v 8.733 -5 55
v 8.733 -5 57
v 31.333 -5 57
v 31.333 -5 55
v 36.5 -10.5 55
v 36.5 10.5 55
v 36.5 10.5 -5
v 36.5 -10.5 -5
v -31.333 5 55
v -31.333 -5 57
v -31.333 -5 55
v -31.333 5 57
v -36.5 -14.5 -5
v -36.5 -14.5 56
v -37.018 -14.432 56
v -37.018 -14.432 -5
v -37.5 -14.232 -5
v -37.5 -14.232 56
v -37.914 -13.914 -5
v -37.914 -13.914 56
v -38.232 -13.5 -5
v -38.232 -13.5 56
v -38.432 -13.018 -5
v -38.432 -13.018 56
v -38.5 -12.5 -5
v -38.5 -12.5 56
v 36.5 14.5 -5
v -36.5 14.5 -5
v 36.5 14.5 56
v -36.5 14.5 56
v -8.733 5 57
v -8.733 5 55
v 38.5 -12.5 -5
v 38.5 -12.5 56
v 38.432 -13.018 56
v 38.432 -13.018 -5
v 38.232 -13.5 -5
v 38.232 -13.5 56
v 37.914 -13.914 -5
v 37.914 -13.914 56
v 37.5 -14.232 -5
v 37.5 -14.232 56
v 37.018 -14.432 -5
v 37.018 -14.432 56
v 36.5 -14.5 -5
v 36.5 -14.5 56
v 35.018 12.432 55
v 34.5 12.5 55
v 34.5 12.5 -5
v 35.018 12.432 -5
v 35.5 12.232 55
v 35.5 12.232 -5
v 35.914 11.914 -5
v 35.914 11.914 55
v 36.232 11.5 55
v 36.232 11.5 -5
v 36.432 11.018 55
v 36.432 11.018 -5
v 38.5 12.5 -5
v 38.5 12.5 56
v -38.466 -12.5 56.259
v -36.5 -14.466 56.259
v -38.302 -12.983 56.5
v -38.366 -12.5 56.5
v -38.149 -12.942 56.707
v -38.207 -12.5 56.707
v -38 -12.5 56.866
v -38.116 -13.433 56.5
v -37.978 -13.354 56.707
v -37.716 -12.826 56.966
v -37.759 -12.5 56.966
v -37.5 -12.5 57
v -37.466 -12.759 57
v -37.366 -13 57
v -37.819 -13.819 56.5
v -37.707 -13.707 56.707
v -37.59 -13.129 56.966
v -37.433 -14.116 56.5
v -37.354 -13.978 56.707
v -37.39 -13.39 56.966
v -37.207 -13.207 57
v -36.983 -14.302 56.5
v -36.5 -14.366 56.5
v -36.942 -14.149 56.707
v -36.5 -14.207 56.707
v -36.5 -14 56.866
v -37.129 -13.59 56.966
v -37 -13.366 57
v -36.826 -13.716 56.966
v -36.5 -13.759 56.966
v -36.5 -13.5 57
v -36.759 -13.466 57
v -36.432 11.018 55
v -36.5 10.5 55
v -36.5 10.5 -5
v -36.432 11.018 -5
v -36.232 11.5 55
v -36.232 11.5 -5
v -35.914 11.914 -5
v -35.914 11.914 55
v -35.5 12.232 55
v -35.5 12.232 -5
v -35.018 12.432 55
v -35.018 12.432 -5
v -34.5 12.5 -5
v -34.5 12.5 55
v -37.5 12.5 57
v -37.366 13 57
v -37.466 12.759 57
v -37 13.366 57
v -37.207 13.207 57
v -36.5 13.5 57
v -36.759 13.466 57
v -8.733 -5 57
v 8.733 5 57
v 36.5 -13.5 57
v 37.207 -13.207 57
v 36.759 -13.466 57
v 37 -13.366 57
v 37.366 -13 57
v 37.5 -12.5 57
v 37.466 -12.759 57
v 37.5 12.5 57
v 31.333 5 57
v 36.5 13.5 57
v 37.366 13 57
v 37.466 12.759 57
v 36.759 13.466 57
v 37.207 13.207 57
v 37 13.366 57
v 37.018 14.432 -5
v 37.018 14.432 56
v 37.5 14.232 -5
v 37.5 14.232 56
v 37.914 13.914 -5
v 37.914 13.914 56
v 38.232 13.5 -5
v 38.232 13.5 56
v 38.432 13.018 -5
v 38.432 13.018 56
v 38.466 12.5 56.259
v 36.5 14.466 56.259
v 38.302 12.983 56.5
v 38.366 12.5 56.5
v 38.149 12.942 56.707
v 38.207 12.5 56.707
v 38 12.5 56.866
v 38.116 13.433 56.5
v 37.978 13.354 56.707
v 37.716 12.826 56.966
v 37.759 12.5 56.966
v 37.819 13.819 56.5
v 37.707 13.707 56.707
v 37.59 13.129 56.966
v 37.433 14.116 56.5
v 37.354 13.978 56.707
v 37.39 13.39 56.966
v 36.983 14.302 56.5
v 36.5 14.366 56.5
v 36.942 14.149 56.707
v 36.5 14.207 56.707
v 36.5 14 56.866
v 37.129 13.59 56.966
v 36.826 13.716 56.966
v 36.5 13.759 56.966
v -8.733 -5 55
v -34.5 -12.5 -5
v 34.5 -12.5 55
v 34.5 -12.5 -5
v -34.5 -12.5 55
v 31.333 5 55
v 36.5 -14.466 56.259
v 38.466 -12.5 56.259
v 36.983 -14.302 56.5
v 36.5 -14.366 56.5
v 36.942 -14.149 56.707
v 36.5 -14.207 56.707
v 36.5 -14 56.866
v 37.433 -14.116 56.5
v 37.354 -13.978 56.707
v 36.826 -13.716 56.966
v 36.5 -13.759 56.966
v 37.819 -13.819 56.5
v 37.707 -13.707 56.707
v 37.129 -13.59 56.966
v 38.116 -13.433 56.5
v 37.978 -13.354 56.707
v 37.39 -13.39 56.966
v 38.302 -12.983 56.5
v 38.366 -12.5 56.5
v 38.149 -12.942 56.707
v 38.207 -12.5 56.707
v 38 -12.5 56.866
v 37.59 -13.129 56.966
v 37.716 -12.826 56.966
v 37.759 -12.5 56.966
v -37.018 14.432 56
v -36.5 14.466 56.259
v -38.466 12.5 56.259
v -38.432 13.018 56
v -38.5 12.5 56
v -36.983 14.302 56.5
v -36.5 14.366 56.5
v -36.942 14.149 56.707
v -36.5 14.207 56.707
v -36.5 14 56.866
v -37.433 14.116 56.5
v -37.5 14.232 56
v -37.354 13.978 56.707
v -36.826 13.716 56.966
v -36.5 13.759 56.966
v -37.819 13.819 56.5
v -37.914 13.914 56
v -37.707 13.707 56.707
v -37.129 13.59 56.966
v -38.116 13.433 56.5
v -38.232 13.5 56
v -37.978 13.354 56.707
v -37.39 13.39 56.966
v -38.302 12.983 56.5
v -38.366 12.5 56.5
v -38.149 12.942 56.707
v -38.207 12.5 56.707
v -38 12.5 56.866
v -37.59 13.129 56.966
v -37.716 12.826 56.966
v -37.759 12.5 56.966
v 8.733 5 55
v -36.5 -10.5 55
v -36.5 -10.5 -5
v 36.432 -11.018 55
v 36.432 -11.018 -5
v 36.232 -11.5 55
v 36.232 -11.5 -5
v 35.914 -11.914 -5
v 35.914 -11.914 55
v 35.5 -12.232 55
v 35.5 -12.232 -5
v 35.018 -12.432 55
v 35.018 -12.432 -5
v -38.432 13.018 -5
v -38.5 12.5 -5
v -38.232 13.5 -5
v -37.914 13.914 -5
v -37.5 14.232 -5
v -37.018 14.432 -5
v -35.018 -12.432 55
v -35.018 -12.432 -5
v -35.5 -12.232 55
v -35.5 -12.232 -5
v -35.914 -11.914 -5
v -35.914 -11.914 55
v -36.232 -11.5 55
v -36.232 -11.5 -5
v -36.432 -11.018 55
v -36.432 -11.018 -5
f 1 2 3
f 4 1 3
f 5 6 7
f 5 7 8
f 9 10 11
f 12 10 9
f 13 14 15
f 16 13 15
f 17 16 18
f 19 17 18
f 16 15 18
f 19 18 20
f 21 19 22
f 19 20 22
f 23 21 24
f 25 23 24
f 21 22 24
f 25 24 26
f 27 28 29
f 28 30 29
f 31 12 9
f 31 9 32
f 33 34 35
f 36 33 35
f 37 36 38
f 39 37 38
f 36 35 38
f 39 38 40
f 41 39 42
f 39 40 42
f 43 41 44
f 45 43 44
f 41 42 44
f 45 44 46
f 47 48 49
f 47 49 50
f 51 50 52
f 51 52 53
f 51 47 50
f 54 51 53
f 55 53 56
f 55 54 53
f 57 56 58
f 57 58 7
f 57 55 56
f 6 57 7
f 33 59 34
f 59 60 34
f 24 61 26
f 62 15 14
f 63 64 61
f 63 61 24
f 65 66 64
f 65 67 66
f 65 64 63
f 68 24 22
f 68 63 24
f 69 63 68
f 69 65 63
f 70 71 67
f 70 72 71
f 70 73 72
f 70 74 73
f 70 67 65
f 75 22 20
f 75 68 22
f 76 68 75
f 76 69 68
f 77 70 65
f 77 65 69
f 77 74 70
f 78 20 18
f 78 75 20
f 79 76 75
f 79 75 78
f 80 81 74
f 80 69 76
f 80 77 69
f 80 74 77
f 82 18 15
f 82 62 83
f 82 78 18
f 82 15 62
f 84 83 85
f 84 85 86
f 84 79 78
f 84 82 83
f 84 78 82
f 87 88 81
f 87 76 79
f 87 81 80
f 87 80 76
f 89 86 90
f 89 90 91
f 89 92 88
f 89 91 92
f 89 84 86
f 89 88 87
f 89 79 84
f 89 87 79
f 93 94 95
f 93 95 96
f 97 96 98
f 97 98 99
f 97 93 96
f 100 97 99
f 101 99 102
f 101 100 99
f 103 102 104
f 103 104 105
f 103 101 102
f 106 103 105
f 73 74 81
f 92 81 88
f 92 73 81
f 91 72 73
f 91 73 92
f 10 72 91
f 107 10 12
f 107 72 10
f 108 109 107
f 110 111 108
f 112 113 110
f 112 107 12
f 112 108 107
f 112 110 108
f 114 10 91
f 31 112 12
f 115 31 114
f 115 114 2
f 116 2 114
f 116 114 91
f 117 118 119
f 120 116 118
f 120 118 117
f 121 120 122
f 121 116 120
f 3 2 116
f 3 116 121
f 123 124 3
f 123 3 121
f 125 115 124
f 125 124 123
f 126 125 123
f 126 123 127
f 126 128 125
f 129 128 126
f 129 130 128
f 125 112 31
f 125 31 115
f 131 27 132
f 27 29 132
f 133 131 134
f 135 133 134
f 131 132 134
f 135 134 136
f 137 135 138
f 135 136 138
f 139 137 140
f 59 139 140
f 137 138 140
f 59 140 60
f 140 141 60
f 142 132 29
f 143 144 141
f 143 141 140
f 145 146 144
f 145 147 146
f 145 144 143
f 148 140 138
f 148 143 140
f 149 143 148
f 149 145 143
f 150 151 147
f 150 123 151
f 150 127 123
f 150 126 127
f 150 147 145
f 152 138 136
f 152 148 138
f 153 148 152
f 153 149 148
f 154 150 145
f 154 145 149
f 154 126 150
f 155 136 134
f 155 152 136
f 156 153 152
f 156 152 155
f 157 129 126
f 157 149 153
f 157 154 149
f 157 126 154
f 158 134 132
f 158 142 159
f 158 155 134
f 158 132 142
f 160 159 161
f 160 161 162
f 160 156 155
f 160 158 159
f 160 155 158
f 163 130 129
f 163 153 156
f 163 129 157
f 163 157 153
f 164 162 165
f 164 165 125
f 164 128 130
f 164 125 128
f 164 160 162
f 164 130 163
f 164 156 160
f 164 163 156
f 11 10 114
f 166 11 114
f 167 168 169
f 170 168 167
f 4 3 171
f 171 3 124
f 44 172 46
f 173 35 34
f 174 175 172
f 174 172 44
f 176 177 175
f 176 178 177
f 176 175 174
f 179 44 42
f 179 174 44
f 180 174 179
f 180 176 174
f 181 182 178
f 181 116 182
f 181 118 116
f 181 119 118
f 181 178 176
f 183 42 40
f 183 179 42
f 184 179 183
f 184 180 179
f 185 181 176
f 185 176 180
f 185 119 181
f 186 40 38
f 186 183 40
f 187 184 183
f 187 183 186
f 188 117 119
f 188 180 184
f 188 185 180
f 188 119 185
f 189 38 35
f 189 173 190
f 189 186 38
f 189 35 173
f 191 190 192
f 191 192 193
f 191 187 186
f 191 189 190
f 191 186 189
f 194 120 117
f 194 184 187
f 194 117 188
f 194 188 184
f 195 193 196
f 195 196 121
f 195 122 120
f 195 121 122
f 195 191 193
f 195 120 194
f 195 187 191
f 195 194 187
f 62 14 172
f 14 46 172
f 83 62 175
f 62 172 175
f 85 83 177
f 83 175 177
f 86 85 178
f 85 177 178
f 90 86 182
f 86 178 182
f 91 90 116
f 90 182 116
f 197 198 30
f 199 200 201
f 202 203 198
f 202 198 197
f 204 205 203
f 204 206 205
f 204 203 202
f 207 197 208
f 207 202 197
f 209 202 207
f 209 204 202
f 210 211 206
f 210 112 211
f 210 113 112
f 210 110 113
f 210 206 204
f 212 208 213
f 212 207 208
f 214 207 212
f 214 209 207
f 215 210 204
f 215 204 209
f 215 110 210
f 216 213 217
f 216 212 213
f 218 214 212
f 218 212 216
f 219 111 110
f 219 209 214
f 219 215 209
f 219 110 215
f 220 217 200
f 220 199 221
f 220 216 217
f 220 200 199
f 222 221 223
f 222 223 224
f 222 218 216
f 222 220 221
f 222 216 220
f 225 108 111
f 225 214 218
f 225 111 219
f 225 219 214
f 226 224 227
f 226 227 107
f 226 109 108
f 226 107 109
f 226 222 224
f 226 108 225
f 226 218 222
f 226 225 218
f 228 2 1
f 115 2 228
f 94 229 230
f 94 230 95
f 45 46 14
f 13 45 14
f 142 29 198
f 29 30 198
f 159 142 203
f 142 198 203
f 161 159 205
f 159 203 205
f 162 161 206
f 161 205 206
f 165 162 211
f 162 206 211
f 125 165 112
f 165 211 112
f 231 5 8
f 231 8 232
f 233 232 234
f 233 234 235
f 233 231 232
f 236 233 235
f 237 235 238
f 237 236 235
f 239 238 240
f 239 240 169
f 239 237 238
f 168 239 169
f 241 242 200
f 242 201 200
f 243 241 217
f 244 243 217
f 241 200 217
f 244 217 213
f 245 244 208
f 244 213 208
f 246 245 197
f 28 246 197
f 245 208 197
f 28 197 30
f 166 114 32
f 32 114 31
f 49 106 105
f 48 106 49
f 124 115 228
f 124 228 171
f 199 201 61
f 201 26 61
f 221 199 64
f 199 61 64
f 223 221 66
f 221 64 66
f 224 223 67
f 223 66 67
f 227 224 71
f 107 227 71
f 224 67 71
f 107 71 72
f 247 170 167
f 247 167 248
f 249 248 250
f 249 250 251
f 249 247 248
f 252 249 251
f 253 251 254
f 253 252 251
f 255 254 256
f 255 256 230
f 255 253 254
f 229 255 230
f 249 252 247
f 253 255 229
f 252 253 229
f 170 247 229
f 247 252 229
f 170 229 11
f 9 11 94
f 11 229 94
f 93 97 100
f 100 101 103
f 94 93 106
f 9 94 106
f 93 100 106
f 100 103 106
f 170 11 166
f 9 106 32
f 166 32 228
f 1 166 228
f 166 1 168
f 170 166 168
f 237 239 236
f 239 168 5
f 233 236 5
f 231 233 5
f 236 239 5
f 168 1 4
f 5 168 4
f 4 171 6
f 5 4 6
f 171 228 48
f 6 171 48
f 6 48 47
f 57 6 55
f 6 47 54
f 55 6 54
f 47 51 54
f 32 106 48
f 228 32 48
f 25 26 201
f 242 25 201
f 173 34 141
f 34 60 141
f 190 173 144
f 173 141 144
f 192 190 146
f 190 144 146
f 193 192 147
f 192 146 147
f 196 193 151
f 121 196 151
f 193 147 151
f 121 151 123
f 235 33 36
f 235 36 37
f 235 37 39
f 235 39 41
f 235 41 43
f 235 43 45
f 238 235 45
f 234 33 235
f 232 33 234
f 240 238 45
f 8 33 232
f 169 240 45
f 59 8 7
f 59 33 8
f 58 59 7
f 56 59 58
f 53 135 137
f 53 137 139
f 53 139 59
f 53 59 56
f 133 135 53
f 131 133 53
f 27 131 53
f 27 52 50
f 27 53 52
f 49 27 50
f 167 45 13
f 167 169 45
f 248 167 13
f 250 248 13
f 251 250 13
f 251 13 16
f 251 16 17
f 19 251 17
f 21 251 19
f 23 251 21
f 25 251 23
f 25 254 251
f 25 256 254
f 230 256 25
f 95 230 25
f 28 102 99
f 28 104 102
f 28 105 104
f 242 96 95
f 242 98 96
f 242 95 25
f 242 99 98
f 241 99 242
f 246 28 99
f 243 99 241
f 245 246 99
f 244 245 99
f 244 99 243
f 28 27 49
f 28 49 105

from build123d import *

# Parameters (mm, degrees)
BOSS_EXTRUDE1_DEPTH = 55
BOSS_EXTRUDE2_DEPTH = 2
SKETCH3_W           = 22.6
SKETCH3_H           = 10
CUT_EXTRUDE1_DEPTH  = 12
FILLET1_R           = 1
BOSS_EXTRUDE3_DEPTH = 5


with BuildPart() as part:
    # Sketch1 → Boss-Extrude1 (new body)
    with BuildSketch(Plane.XY):
        with BuildLine():
            Line((36.5, -14.5), (-36.5, -14.5))
            ThreePointArc((-36.5, -14.5), (-37.914213562, -13.914213562), (-38.5, -12.5))
            Line((-38.5, -12.5), (-38.5, 12.5))
            ThreePointArc((-38.5, 12.5), (-37.914213562, 13.914213562), (-36.5, 14.5))
            Line((-36.5, 14.5), (36.5, 14.5))
            ThreePointArc((36.5, 14.5), (37.914213562, 13.914213562), (38.5, 12.5))
            Line((38.5, 12.5), (38.5, -12.5))
            ThreePointArc((38.5, -12.5), (37.914213562, -13.914213562), (36.5, -14.5))
        make_face()
        with BuildLine():
            Line((-34.5, -12.5), (34.5, -12.5))
            ThreePointArc((34.5, -12.5), (35.914213562, -11.914213562), (36.5, -10.5))
            Line((36.5, -10.5), (36.5, 10.5))
            ThreePointArc((36.5, 10.5), (35.914213562, 11.914213562), (34.5, 12.5))
            Line((34.5, 12.5), (-34.5, 12.5))
            ThreePointArc((-34.5, 12.5), (-35.914213562, 11.914213562), (-36.5, 10.5))
            Line((-36.5, 10.5), (-36.5, -10.5))
            ThreePointArc((-36.5, -10.5), (-35.914213562, -11.914213562), (-34.5, -12.5))
        make_face(mode=Mode.SUBTRACT)
    extrude(amount=BOSS_EXTRUDE1_DEPTH)

    # Sketch2 → Boss-Extrude2 (add)
    with BuildSketch(Plane.XY.offset(55)):
        with BuildLine():
            Line((-36.5, -14.5), (36.5, -14.5))
            ThreePointArc((36.5, -14.5), (37.914213562, -13.914213562), (38.5, -12.5))
            Line((38.5, -12.5), (38.5, 12.5))
            ThreePointArc((38.5, 12.5), (37.914213562, 13.914213562), (36.5, 14.5))
            Line((36.5, 14.5), (-36.5, 14.5))
            ThreePointArc((-36.5, 14.5), (-37.914213562, 13.914213562), (-38.5, 12.5))
            Line((-38.5, 12.5), (-38.5, -12.5))
            ThreePointArc((-38.5, -12.5), (-37.914213562, -13.914213562), (-36.5, -14.5))
        make_face()
    extrude(amount=BOSS_EXTRUDE2_DEPTH)

    # Sketch3 → Cut-Extrude1 (cut)
    with BuildSketch(Plane.XY.offset(57)):
        with Locations((-20.033386602, 0)):
            Rectangle(SKETCH3_W, SKETCH3_H)
        with Locations((20.033386602, 0)):
            Rectangle(SKETCH3_W, SKETCH3_H)
    extrude(amount=-CUT_EXTRUDE1_DEPTH, mode=Mode.SUBTRACT)

    # Fillet1
    fillet1_edges = [part.edges().sort_by_distance(p)[0] for p in [
        (-37.914213562, -13.914213562, 57),
        (0, -14.5, 57),
        (37.914213562, -13.914213562, 57),
        (38.5, 0, 57),
        (37.914213562, 13.914213562, 57),
        (0, 14.5, 57),
        (-37.914213562, 13.914213562, 57),
        (-38.5, 0, 57),
    ]]
    fillet(fillet1_edges, radius=FILLET1_R)

    # Sketch4 → Boss-Extrude3 (add)
    with BuildSketch(Plane(origin=(0, 0, 0), x_dir=(-1, 0, 0), z_dir=(0, 0, -1))):
        with BuildLine():
            Line((38.5, -12.5), (38.5, 12.5))
            ThreePointArc((38.5, 12.5), (37.914213562, 13.914213562), (36.5, 14.5))
            Line((36.5, 14.5), (-36.5, 14.5))
            ThreePointArc((-36.5, 14.5), (-37.914213562, 13.914213562), (-38.5, 12.5))
            Line((-38.5, 12.5), (-38.5, -12.5))
            ThreePointArc((-38.5, -12.5), (-37.914213562, -13.914213562), (-36.5, -14.5))
            Line((-36.5, -14.5), (36.5, -14.5))
            ThreePointArc((36.5, -14.5), (37.914213562, -13.914213562), (38.5, -12.5))
        make_face()
        with BuildLine():
            Line((-34.5, -12.5), (34.5, -12.5))
            ThreePointArc((34.5, -12.5), (35.914213562, -11.914213562), (36.5, -10.5))
            Line((36.5, -10.5), (36.5, 10.5))
            ThreePointArc((36.5, 10.5), (35.914213562, 11.914213562), (34.5, 12.5))
            Line((34.5, 12.5), (-34.5, 12.5))
            ThreePointArc((-34.5, 12.5), (-35.914213562, 11.914213562), (-36.5, 10.5))
            Line((-36.5, 10.5), (-36.5, -10.5))
            ThreePointArc((-36.5, -10.5), (-35.914213562, -11.914213562), (-34.5, -12.5))
        make_face(mode=Mode.SUBTRACT)
    extrude(amount=BOSS_EXTRUDE3_DEPTH)


solid = part.part
